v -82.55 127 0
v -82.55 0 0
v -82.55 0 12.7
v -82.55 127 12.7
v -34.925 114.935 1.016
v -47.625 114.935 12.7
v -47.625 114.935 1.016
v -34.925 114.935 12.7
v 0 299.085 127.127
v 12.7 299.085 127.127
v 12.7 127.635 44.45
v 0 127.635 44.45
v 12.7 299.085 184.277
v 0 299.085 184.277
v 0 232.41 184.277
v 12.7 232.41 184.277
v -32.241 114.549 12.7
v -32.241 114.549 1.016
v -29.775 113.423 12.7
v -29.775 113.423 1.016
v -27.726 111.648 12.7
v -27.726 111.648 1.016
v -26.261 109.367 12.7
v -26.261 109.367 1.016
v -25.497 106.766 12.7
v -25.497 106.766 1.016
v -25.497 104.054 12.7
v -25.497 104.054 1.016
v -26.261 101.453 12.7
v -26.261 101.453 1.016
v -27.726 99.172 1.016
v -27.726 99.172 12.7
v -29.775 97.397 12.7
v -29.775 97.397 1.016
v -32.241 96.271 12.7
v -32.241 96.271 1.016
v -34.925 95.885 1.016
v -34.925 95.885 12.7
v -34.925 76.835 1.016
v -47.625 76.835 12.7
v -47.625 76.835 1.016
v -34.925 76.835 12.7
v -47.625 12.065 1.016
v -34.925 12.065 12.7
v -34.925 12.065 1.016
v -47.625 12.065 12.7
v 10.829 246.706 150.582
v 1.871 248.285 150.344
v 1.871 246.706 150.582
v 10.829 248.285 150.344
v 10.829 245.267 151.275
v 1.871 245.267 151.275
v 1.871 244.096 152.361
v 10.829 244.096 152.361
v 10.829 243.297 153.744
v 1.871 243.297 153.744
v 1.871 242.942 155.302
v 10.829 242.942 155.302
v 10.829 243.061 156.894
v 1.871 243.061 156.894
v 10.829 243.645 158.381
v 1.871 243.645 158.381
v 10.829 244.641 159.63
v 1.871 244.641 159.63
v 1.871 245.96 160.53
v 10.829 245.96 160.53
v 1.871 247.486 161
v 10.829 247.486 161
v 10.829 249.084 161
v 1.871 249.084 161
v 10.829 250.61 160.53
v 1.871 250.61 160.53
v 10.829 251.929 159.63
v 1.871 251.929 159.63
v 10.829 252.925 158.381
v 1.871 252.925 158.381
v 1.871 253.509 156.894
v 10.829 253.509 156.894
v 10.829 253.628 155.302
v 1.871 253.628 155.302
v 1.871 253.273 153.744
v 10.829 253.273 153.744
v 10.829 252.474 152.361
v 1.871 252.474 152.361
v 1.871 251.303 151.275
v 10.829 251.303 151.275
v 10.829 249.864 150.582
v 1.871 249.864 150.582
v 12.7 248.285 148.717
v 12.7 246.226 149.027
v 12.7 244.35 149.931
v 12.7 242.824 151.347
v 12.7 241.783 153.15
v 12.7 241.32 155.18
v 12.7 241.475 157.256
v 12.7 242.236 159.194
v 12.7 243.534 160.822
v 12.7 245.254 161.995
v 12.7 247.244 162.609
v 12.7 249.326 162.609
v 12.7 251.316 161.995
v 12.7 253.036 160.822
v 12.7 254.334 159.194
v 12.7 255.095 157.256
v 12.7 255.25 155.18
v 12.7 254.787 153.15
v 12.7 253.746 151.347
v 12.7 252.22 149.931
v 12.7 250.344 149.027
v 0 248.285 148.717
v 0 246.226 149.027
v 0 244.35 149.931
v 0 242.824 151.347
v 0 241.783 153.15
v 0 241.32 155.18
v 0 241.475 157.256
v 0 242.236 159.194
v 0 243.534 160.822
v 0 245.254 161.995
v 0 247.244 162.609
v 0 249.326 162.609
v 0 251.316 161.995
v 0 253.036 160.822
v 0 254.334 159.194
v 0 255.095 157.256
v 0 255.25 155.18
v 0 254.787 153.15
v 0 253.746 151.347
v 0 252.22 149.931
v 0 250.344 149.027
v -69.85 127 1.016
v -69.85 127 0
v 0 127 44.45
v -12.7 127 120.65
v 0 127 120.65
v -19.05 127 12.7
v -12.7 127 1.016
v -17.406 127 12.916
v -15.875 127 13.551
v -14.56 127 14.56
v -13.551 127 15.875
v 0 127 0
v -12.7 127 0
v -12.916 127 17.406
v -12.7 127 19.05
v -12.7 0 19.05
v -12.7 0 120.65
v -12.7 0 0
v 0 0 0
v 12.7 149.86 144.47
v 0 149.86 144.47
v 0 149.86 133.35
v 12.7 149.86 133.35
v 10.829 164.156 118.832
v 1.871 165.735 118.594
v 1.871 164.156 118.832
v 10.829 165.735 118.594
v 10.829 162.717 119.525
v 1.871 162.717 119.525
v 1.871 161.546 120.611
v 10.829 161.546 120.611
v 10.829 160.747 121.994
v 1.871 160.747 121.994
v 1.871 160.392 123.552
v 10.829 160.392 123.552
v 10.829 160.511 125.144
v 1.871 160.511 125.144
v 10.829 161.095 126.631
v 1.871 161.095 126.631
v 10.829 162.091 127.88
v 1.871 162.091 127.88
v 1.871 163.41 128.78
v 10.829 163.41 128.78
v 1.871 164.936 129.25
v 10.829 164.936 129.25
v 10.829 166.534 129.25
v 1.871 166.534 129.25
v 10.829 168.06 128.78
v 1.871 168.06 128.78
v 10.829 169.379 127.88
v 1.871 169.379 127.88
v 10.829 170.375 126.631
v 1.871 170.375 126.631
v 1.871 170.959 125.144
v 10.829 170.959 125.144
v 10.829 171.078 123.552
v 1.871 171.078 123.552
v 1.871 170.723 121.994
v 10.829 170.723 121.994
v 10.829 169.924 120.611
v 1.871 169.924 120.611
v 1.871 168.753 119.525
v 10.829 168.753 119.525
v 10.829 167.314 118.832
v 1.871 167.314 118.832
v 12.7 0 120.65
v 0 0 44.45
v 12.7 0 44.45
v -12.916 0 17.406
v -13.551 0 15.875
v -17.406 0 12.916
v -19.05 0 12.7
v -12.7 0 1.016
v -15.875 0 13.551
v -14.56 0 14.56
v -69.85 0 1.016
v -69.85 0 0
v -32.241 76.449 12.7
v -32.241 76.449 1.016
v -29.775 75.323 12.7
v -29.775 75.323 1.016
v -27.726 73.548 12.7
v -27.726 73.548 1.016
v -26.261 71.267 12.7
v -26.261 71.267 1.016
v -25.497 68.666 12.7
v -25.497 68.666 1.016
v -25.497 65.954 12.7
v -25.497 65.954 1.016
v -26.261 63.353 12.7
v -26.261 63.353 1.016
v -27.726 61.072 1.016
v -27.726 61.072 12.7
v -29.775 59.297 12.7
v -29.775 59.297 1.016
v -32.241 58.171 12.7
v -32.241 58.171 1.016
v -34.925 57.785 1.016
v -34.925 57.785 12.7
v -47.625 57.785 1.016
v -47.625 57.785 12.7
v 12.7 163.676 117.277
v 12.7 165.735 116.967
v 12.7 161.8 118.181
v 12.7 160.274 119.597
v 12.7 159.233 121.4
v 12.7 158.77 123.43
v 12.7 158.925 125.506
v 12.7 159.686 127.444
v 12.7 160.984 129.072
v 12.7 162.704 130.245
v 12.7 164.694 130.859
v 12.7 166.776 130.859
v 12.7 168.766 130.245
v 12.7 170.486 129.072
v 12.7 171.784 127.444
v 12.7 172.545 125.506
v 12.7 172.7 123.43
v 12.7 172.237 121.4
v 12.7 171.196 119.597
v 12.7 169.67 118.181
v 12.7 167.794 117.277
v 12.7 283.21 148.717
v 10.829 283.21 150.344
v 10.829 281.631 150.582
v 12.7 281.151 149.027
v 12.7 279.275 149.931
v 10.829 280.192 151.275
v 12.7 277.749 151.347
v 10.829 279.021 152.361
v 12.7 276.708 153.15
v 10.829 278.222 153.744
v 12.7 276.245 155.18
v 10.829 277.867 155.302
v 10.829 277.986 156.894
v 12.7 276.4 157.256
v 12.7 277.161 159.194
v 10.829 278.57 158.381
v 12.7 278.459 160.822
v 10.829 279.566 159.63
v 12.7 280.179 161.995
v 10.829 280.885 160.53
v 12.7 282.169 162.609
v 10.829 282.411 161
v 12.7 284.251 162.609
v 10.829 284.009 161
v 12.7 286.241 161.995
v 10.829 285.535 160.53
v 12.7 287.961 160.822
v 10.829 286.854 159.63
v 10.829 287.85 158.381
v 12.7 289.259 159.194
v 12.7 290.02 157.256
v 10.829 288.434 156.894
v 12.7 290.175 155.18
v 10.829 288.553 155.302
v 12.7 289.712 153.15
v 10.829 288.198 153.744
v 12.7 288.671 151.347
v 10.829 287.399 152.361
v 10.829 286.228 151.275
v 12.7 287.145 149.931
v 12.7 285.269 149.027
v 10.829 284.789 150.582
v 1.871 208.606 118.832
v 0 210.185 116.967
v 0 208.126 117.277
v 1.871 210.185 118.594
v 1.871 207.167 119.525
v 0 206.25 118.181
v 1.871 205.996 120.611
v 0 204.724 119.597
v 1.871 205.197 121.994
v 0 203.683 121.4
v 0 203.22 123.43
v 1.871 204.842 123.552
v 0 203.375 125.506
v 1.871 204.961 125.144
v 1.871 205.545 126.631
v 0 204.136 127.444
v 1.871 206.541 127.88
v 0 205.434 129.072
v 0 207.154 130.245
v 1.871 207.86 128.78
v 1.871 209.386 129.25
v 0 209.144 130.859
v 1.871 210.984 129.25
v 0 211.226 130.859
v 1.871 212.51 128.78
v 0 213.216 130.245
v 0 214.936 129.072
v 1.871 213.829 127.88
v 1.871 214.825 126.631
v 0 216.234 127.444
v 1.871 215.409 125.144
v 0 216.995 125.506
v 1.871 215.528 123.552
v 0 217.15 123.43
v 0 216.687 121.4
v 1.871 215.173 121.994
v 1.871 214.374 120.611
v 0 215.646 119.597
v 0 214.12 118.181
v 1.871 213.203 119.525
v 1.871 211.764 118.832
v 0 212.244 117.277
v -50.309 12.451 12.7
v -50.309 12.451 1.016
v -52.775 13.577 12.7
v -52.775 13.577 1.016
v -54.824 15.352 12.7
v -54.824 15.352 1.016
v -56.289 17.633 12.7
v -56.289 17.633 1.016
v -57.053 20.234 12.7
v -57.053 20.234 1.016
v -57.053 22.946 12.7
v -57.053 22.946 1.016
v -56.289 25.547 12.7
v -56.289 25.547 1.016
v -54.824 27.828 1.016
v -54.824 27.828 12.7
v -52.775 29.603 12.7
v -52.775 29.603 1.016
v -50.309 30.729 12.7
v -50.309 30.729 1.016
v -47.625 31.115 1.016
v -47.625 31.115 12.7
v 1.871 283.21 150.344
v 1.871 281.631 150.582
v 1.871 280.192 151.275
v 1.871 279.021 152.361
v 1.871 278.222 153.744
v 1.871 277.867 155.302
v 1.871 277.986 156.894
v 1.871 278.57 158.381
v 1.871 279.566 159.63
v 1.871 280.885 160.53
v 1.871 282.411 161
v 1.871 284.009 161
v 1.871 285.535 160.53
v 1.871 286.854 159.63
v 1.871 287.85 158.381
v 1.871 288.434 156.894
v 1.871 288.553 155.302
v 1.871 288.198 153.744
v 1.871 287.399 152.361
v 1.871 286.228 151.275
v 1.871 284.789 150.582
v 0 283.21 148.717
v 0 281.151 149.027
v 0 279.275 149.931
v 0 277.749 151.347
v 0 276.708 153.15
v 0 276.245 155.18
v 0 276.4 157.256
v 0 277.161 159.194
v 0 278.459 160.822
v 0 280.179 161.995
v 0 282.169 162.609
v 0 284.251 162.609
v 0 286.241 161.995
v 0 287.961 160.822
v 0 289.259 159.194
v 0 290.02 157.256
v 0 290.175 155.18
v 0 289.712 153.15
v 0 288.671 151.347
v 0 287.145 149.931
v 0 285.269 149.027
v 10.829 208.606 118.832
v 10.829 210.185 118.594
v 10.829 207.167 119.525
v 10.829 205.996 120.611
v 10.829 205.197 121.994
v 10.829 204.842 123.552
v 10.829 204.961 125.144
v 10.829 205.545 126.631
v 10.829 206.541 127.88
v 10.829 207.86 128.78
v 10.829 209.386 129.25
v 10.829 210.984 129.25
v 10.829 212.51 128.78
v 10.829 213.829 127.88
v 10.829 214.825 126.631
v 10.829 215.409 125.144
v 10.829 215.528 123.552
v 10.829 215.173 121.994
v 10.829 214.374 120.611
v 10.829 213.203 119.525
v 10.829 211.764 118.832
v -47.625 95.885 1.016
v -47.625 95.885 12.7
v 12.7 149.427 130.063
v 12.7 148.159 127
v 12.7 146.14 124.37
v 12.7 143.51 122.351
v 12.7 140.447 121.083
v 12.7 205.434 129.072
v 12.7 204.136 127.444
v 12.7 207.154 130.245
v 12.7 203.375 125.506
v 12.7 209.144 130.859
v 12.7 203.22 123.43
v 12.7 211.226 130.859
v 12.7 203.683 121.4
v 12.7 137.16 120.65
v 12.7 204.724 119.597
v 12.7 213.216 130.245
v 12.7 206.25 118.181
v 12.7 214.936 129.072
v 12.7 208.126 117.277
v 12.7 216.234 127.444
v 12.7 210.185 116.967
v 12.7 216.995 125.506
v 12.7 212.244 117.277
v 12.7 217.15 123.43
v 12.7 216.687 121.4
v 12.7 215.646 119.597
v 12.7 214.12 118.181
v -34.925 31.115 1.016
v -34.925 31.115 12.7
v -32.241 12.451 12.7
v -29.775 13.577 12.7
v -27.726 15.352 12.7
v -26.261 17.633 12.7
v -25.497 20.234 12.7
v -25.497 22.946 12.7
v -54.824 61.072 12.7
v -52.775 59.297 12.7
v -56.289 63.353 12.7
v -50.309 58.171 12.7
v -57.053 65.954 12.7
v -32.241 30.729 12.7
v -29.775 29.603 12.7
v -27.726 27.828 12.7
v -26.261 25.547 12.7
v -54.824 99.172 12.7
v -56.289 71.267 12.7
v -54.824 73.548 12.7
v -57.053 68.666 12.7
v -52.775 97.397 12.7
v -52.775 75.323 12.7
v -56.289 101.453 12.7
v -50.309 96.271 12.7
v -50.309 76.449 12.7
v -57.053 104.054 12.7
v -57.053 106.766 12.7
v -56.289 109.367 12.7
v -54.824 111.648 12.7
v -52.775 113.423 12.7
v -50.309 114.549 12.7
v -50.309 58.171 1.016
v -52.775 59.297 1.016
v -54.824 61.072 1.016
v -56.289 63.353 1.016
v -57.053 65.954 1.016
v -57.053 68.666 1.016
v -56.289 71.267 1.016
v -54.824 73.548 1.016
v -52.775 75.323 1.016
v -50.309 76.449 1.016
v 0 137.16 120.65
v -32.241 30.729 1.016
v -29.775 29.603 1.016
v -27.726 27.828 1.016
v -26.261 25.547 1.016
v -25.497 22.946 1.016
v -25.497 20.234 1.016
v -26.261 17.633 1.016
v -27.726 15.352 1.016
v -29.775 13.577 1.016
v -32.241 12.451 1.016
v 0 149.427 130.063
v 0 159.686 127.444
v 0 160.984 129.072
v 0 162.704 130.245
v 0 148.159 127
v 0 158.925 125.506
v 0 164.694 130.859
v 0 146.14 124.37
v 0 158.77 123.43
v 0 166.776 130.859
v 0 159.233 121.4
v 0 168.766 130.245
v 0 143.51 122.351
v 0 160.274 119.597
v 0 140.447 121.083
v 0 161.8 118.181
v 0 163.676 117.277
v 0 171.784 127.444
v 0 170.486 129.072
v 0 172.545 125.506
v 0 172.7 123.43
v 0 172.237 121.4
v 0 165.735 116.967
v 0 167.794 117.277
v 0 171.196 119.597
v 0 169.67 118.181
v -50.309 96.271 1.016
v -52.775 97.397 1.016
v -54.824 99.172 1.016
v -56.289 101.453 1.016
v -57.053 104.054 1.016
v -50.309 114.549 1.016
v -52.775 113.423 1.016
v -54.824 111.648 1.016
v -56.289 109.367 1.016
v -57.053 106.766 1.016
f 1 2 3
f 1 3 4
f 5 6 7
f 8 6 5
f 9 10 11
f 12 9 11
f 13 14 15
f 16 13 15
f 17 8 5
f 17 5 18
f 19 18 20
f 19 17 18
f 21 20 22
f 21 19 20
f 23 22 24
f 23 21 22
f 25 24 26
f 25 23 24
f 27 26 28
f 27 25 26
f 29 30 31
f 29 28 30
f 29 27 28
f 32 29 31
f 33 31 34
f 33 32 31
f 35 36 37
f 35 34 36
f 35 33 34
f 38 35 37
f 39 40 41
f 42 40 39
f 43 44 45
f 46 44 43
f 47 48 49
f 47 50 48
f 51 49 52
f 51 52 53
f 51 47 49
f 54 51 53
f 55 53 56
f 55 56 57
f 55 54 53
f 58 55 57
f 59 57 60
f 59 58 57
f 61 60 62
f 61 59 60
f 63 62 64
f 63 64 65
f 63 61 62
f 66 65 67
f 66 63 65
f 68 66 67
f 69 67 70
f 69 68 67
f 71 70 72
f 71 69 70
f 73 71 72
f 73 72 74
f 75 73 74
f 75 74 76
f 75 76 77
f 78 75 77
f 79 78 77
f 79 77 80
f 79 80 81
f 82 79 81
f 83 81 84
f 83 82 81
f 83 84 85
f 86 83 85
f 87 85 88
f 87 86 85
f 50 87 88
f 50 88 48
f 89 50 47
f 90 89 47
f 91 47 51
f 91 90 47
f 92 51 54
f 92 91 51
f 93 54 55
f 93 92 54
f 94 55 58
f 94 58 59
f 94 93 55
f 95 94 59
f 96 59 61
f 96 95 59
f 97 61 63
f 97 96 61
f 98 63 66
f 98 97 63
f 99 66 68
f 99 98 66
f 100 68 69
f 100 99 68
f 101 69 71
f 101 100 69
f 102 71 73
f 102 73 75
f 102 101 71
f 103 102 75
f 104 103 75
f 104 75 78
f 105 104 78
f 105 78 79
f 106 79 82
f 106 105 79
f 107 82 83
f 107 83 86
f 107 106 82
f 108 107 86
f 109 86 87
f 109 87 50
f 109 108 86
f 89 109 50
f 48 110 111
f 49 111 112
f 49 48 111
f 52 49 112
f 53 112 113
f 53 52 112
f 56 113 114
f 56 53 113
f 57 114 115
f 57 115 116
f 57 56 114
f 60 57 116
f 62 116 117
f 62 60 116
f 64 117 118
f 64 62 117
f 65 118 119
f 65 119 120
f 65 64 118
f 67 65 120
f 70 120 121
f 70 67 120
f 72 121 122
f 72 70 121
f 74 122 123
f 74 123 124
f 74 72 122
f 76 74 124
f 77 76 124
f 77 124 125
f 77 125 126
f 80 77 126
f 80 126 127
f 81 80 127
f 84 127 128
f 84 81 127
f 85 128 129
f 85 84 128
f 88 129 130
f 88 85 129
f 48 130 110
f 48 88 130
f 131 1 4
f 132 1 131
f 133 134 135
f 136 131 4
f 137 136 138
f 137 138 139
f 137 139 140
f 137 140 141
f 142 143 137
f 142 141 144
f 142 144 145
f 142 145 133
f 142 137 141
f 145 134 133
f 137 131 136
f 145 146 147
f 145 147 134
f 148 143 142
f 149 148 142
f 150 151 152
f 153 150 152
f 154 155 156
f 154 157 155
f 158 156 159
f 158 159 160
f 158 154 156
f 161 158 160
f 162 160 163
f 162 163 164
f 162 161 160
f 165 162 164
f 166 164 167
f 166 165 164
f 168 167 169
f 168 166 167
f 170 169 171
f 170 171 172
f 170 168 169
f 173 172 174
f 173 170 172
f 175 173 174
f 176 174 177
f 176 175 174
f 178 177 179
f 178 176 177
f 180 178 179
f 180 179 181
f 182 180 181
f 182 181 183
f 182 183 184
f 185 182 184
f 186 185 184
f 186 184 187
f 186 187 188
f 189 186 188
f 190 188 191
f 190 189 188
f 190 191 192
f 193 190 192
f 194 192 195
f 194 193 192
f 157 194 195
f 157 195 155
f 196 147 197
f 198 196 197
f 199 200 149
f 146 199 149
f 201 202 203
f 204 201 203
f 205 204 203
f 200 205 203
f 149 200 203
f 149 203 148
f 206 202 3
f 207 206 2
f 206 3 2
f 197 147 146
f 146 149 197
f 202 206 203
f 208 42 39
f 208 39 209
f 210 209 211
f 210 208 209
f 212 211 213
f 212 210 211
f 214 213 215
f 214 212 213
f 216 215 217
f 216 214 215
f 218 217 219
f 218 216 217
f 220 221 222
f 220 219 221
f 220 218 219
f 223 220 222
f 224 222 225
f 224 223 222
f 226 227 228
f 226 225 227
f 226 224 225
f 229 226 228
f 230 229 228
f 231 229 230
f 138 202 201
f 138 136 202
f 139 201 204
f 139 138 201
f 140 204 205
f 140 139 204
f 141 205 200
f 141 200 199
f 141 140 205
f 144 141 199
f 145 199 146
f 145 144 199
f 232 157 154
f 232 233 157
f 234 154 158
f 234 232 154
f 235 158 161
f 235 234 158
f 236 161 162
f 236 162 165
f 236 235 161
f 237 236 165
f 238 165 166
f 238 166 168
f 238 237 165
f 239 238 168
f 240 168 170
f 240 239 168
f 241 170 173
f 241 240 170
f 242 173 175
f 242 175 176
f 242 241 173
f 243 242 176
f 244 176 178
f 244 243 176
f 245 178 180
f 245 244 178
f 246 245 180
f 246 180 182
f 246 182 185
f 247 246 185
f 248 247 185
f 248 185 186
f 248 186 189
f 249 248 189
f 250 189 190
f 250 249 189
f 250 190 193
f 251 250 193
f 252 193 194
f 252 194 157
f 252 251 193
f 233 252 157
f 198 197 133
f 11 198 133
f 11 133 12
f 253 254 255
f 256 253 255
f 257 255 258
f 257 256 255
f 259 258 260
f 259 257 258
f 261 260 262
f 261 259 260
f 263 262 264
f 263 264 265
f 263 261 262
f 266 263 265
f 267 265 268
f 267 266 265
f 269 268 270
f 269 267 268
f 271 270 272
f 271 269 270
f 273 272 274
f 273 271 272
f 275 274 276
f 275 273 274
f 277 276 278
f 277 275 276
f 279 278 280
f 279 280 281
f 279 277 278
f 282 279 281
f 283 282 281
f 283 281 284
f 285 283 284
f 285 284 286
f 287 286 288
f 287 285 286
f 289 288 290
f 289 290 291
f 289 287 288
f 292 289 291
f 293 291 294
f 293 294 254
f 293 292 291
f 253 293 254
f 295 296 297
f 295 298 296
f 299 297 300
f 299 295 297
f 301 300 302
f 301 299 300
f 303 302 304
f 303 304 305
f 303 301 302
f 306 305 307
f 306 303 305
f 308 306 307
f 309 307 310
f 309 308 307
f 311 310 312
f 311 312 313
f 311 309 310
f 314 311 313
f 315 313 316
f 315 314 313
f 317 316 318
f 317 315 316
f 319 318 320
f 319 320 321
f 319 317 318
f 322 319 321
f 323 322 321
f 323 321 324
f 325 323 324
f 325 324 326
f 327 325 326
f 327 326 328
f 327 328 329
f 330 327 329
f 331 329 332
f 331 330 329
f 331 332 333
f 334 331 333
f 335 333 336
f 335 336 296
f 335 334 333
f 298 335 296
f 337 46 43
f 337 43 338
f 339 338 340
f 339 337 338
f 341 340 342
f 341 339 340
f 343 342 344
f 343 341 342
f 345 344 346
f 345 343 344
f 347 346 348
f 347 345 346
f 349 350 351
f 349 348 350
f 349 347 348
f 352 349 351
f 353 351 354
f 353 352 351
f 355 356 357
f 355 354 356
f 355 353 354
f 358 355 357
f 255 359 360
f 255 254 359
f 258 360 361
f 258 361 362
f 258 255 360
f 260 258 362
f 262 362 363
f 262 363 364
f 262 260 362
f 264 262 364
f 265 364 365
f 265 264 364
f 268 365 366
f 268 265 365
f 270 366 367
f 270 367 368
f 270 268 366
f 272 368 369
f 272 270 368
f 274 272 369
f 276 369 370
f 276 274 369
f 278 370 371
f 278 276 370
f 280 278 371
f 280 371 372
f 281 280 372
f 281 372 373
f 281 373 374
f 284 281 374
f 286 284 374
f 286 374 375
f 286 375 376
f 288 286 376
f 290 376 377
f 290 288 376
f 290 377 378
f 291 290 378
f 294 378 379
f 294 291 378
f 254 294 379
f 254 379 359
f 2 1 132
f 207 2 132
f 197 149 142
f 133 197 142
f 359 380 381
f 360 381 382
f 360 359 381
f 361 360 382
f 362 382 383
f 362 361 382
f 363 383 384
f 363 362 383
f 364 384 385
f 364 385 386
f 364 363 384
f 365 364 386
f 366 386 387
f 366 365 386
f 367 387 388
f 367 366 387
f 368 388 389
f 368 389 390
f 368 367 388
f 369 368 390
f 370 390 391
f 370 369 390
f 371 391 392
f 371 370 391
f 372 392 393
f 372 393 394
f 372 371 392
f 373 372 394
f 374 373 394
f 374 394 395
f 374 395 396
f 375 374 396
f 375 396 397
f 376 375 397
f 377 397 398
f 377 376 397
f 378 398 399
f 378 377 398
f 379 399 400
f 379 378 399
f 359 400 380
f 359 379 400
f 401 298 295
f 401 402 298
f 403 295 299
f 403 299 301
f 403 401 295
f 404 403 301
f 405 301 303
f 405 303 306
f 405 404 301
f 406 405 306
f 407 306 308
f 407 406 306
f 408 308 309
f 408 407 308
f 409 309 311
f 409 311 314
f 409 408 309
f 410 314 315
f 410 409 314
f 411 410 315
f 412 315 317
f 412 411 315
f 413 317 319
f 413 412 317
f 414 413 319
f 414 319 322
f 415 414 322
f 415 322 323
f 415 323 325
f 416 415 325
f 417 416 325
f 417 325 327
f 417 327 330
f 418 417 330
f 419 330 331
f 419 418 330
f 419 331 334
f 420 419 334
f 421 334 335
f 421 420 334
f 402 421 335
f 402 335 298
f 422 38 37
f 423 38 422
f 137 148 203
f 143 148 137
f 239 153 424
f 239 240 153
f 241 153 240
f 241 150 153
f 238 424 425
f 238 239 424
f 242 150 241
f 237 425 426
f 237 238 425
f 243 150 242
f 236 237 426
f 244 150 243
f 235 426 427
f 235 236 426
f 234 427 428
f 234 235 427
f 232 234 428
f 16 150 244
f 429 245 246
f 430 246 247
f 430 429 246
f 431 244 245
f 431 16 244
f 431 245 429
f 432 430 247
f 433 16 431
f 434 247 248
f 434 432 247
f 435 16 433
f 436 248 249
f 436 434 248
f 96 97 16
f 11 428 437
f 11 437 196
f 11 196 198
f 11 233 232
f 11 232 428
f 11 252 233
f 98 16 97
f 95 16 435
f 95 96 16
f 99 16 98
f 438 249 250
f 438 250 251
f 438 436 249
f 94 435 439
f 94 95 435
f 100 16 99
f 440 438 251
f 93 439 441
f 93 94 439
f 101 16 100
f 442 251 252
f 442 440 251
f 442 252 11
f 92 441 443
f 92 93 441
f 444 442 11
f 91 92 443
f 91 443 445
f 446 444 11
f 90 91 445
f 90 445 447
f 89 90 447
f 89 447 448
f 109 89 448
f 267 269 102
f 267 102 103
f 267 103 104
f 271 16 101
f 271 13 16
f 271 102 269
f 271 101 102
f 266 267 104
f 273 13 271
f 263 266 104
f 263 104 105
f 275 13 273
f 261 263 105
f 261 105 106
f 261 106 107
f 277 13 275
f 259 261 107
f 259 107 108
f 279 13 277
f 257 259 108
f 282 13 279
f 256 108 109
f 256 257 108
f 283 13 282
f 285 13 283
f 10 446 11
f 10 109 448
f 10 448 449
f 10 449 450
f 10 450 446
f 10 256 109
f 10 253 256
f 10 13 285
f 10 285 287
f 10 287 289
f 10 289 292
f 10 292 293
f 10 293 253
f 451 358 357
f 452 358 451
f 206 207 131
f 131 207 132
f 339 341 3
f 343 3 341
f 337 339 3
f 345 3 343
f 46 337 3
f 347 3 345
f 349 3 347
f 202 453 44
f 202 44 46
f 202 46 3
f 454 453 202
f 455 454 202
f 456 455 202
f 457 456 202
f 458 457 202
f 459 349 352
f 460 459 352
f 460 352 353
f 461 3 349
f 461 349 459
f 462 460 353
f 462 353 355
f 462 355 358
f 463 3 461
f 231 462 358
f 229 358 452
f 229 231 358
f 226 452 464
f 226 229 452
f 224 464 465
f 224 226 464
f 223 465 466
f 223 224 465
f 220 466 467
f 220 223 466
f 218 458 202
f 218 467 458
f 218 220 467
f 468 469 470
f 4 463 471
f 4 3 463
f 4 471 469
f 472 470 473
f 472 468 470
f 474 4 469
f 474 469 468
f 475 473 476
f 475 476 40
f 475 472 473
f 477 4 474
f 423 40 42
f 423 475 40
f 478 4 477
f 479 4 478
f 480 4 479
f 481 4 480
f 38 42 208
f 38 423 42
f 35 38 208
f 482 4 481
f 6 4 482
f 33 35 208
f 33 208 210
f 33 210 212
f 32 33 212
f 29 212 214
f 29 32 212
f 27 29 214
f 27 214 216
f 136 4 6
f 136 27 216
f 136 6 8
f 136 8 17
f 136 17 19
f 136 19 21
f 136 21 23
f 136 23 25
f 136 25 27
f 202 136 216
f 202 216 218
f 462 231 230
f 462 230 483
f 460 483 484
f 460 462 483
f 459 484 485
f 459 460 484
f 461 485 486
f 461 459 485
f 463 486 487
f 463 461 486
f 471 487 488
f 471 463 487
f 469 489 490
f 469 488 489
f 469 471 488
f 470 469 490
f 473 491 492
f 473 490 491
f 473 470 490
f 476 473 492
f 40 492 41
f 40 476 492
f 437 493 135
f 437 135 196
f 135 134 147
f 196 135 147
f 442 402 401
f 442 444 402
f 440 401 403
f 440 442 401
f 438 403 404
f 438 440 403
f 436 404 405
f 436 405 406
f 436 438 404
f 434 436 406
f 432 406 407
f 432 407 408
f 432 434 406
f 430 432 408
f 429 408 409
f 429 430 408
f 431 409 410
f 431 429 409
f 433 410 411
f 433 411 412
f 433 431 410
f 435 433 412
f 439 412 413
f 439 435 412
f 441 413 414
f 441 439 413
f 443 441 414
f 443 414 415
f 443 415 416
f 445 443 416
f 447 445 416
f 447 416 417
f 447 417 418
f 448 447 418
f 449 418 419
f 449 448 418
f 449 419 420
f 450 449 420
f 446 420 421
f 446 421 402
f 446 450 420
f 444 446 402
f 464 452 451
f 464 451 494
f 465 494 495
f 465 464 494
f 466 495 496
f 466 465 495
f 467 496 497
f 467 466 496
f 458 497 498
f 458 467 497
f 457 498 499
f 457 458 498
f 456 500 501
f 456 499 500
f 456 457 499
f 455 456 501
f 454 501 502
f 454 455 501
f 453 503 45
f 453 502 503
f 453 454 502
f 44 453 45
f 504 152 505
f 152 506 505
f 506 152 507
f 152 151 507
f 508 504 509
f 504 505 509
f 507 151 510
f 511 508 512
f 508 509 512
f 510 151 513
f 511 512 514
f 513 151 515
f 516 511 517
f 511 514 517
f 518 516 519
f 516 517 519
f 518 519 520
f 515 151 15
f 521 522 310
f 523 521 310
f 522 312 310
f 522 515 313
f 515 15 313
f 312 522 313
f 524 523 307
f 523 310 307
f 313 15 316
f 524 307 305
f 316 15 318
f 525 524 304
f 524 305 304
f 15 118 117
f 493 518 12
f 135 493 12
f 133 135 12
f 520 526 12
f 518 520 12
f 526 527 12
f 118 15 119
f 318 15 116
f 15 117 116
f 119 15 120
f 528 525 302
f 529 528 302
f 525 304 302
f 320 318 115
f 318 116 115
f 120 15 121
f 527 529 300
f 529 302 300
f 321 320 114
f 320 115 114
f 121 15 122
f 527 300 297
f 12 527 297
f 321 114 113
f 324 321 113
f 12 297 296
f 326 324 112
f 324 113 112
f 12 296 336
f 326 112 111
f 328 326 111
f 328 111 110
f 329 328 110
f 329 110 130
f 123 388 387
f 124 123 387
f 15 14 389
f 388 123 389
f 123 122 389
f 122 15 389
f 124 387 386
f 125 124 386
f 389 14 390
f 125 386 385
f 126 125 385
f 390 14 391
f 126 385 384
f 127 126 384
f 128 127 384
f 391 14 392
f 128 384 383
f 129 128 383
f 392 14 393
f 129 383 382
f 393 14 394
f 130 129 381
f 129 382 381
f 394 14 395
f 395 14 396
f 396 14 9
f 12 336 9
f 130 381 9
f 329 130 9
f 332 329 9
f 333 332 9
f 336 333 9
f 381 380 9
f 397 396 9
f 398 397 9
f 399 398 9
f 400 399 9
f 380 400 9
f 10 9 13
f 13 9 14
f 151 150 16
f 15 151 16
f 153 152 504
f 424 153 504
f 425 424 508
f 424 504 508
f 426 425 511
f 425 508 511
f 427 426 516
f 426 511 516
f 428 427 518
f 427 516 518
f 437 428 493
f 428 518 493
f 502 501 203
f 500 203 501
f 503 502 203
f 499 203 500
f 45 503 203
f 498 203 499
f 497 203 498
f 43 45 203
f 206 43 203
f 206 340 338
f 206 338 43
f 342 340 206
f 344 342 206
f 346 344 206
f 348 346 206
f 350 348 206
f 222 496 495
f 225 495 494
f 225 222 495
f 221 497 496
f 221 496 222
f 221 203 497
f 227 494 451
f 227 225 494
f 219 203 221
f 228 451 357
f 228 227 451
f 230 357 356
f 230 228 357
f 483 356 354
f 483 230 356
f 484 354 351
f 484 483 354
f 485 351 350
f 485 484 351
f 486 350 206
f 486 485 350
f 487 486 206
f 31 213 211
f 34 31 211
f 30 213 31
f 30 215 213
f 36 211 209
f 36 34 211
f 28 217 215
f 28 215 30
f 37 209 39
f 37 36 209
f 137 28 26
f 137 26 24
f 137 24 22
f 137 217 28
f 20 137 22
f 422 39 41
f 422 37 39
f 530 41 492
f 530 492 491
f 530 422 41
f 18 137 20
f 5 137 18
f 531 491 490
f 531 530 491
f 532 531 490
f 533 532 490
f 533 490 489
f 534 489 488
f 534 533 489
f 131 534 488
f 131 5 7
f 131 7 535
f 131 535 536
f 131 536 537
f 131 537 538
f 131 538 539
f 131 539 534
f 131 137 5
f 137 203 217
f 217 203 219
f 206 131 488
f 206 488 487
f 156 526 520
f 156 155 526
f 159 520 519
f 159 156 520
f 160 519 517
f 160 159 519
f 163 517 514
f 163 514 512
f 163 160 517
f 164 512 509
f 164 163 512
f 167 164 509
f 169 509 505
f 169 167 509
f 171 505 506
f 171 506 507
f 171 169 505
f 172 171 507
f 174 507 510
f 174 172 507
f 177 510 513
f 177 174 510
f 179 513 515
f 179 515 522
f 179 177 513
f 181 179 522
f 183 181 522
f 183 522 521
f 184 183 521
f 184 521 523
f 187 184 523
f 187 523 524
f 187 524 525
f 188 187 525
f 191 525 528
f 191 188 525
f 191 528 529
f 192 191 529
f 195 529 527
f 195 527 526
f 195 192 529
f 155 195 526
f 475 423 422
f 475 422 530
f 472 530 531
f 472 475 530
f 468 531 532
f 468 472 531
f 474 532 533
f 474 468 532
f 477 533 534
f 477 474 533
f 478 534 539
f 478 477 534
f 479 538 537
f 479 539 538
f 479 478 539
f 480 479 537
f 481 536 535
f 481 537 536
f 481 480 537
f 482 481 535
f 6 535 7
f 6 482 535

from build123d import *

# Parameters (mm, degrees)
SKETCH1_W                        = 82.55
SKETCH1_H                        = 127
EXTRUDE1_DEPTH                   = 12.7
SKETCH2_W                        = 57.15
SKETCH2_H                        = 127
CUT_EXTRUDE1_DEPTH               = 1.016
CUT_EXTRUDE2_REACH               = 14.7
SKETCH4_W                        = 12.7
SKETCH4_H                        = 127
EXTRUDE3_DEPTH                   = 107.95
EXTRUDE4_DEPTH                   = 12.7
CUT_EXTRUDE3_REACH               = 97.25
CUT_EXTRUDE4_DEPTH               = 96.25
F_1_2_13_TAPPED_HOLE1_AT_2_COUNT = 2
F_1_2_13_TAPPED_HOLE1_AT_2_PITCH = 34.925
F_1_2_13_TAPPED_HOLE2_AT_2_COUNT = 2
F_1_2_13_TAPPED_HOLE2_AT_2_PITCH = 44.45
FILLET1_R                        = 6.35
F_1_2_13_TAPPED_HOLE3_AT_2_COUNT = 2
F_1_2_13_TAPPED_HOLE3_AT_2_PITCH = 34.925
F_1_2_13_TAPPED_HOLE4_AT_2_COUNT = 2
F_1_2_13_TAPPED_HOLE4_AT_2_PITCH = 44.45


with BuildPart() as part:
    # Sketch1 → Extrude1 (new body)
    with BuildSketch(Plane.XY):
        with Locations((-41.275, 63.5)):
            Rectangle(SKETCH1_W, SKETCH1_H)
    extrude(amount=EXTRUDE1_DEPTH)

    # Sketch2 → Cut-Extrude1 (cut)
    with BuildSketch(Plane(origin=(0, 0, 0), x_dir=(-1, 0, 0), z_dir=(0, 0, -1))):
        with Locations((41.275, 63.5)):
            Rectangle(SKETCH2_W, SKETCH2_H)
    extrude(amount=-CUT_EXTRUDE1_DEPTH, mode=Mode.SUBTRACT)

    # Sketch3 → Cut-Extrude2 (cut, up to next)
    with BuildSketch(Plane.XY.offset(12.7), mode=Mode.PRIVATE) as cut_extrude2_sk1:
        with BuildLine():
            Line((-47.625, 114.935), (-34.925, 114.935))
            ThreePointArc((-34.925, 114.935), (-25.4, 105.41), (-34.925, 95.885))
            Line((-34.925, 95.885), (-47.625, 95.885))
            ThreePointArc((-47.625, 95.885), (-57.15, 105.41), (-47.625, 114.935))
        make_face()
    cut_extrude2_tool1 = extrude(cut_extrude2_sk1.sketch, amount=-CUT_EXTRUDE2_REACH, mode=Mode.PRIVATE) & part.part
    add(cut_extrude2_tool1.solids().sort_by_distance((-41.275, 105.41, 12.7))[0], mode=Mode.SUBTRACT)
    # Sketch3 → Cut-Extrude2 (cut, up to next)
    with BuildSketch(Plane.XY.offset(12.7), mode=Mode.PRIVATE) as cut_extrude2_sk2:
        with BuildLine():
            Line((-47.625, 31.115), (-34.925, 31.115))
            ThreePointArc((-34.925, 31.115), (-25.4, 21.59), (-34.925, 12.065))
            Line((-34.925, 12.065), (-47.625, 12.065))
            ThreePointArc((-47.625, 12.065), (-57.15, 21.59), (-47.625, 31.115))
        make_face()
    cut_extrude2_tool2 = extrude(cut_extrude2_sk2.sketch, amount=-CUT_EXTRUDE2_REACH, mode=Mode.PRIVATE) & part.part
    add(cut_extrude2_tool2.solids().sort_by_distance((-41.275, 21.59, 12.7))[0], mode=Mode.SUBTRACT)
    # Sketch3 → Cut-Extrude2 (cut, up to next)
    with BuildSketch(Plane.XY.offset(12.7), mode=Mode.PRIVATE) as cut_extrude2_sk3:
        with BuildLine():
            Line((-47.625, 76.835), (-34.925, 76.835))
            ThreePointArc((-34.925, 76.835), (-25.4, 67.31), (-34.925, 57.785))
            Line((-34.925, 57.785), (-47.625, 57.785))
            ThreePointArc((-47.625, 57.785), (-57.15, 67.31), (-47.625, 76.835))
        make_face()
    cut_extrude2_tool3 = extrude(cut_extrude2_sk3.sketch, amount=-CUT_EXTRUDE2_REACH, mode=Mode.PRIVATE) & part.part
    add(cut_extrude2_tool3.solids().sort_by_distance((-41.275, 67.31, 12.7))[0], mode=Mode.SUBTRACT)

    # Sketch4 → Extrude3 (add)
    with BuildSketch(Plane.XY.offset(12.7)):
        with Locations((-6.35, 63.5)):
            Rectangle(SKETCH4_W, SKETCH4_H)
    extrude(amount=EXTRUDE3_DEPTH)

    # Sketch5 → Extrude4 (add)
    with BuildSketch(Plane(origin=(0, 0, 0), x_dir=(0, 0, -1), z_dir=(1, 0, 0))):
        with BuildLine():
            Line((-120.65, 0), (-44.45, 0))
            Line((-44.45, 0), (-44.45, 299.085))
            Line((-44.45, 299.085), (-184.277, 299.085))
            Line((-184.277, 299.085), (-184.277, 149.86))
            Line((-184.277, 149.86), (-133.35, 149.86))
            ThreePointArc((-133.35, 149.86), (-124.369743879, 146.140256121), (-120.65, 137.16))
            Line((-120.65, 137.16), (-120.65, 0))
        make_face()
    extrude(amount=EXTRUDE4_DEPTH)

    # Sketch6 → Cut-Extrude3 (cut, up to next)
    with BuildSketch(Plane(origin=(12.7, 0, 0), x_dir=(0, 0, -1), z_dir=(1, 0, 0)), mode=Mode.PRIVATE) as cut_extrude3_sk1:
        Polygon((-127.127, 299.085), (-44.45, 127.635), (-44.45, 299.085), align=None)
    cut_extrude3_tool1 = extrude(cut_extrude3_sk1.sketch, amount=-CUT_EXTRUDE3_REACH, mode=Mode.PRIVATE) & part.part
    add(cut_extrude3_tool1.solids().sort_by_distance((12.7, 241.935, 72.009))[0], mode=Mode.SUBTRACT)

    # Sketch7 → Cut-Extrude4 (cut, through all)
    with BuildSketch(Plane(origin=(12.7, 0, 0), x_dir=(0, 0, -1), z_dir=(1, 0, 0))):
        Polygon((-184.277, 149.86), (-144.469555556, 149.86), (-184.277, 232.41), align=None)
    extrude(amount=-CUT_EXTRUDE4_DEPTH, mode=Mode.SUBTRACT)

    # Sketch8 → 1/2-13 Tapped Hole1 (revolve, cut)
    with BuildSketch(Plane(origin=(12.7, 248.285, 155.702), x_dir=(0, 0, -1), z_dir=(0, 1, 0))):
        Polygon((0, 0), (0, 12.7), (6.985, 12.7), (5.35813, 10.828500149), (5.35813, 1.871499851), (6.985, 0), align=None)
    f_1_2_13_tapped_hole1 = revolve(axis=Axis((19.05, 248.285, 155.702), (-1, 0, 0)), mode=Mode.SUBTRACT)

    # 1/2-13 Tapped Hole1 at 2: 1/2-13 Tapped Hole1 ×2
    with Locations(*[(0, i * F_1_2_13_TAPPED_HOLE1_AT_2_PITCH, 0) for i in range(1, F_1_2_13_TAPPED_HOLE1_AT_2_COUNT)]):
        add(f_1_2_13_tapped_hole1, mode=Mode.SUBTRACT)

    # Sketch10 → 1/2-13 Tapped Hole2 (revolve, cut)
    with BuildSketch(Plane(origin=(12.7, 210.185, 123.952), x_dir=(0, 0, -1), z_dir=(0, 1, 0))):
        Polygon((0, 0), (0, 12.7), (6.985, 12.7), (5.35813, 10.828500149), (5.35813, 1.871499851), (6.985, 0), align=None)
    f_1_2_13_tapped_hole2 = revolve(axis=Axis((19.05, 210.185, 123.952), (-1, 0, 0)), mode=Mode.SUBTRACT)

    # 1/2-13 Tapped Hole2 at 2: 1/2-13 Tapped Hole2 ×2
    with Locations(*[(0, -i * F_1_2_13_TAPPED_HOLE2_AT_2_PITCH, 0) for i in range(1, F_1_2_13_TAPPED_HOLE2_AT_2_COUNT)]):
        add(f_1_2_13_tapped_hole2, mode=Mode.SUBTRACT)

    # Fillet1
    fillet1_edges = [part.edges().sort_by_distance(p)[0] for p in [
        (-12.7, 63.5, 12.7),
    ]]
    fillet(fillet1_edges, radius=FILLET1_R)

    # Sketch16 → 1/2-13 Tapped Hole3 (revolve, cut)
    with BuildSketch(Plane(origin=(-95.25, 283.21, 155.702), x_dir=(0, 0, 1), z_dir=(0, 1, 0))):
        Polygon((0, 0), (0, 12.7), (6.985, 12.7), (5.35813, 10.828500149), (5.35813, 1.871499851), (6.985, 0), align=None)
    f_1_2_13_tapped_hole3 = revolve(axis=Axis((-101.6, 283.21, 155.702), (1, 0, 0)), mode=Mode.SUBTRACT)

    # 1/2-13 Tapped Hole3 at 2: 1/2-13 Tapped Hole3 ×2
    with Locations(*[(0, -i * F_1_2_13_TAPPED_HOLE3_AT_2_PITCH, 0) for i in range(1, F_1_2_13_TAPPED_HOLE3_AT_2_COUNT)]):
        add(f_1_2_13_tapped_hole3, mode=Mode.SUBTRACT)

    # Sketch18 → 1/2-13 Tapped Hole4 (revolve, cut)
    with BuildSketch(Plane(origin=(-95.25, 210.185, 123.952), x_dir=(0, 0, 1), z_dir=(0, 1, 0))):
        Polygon((0, 0), (0, 12.7), (6.985, 12.7), (5.35813, 10.828500149), (5.35813, 1.871499851), (6.985, 0), align=None)
    f_1_2_13_tapped_hole4 = revolve(axis=Axis((-101.6, 210.185, 123.952), (1, 0, 0)), mode=Mode.SUBTRACT)

    # 1/2-13 Tapped Hole4 at 2: 1/2-13 Tapped Hole4 ×2
    with Locations(*[(0, -i * F_1_2_13_TAPPED_HOLE4_AT_2_PITCH, 0) for i in range(1, F_1_2_13_TAPPED_HOLE4_AT_2_COUNT)]):
        add(f_1_2_13_tapped_hole4, mode=Mode.SUBTRACT)


solid = part.part
